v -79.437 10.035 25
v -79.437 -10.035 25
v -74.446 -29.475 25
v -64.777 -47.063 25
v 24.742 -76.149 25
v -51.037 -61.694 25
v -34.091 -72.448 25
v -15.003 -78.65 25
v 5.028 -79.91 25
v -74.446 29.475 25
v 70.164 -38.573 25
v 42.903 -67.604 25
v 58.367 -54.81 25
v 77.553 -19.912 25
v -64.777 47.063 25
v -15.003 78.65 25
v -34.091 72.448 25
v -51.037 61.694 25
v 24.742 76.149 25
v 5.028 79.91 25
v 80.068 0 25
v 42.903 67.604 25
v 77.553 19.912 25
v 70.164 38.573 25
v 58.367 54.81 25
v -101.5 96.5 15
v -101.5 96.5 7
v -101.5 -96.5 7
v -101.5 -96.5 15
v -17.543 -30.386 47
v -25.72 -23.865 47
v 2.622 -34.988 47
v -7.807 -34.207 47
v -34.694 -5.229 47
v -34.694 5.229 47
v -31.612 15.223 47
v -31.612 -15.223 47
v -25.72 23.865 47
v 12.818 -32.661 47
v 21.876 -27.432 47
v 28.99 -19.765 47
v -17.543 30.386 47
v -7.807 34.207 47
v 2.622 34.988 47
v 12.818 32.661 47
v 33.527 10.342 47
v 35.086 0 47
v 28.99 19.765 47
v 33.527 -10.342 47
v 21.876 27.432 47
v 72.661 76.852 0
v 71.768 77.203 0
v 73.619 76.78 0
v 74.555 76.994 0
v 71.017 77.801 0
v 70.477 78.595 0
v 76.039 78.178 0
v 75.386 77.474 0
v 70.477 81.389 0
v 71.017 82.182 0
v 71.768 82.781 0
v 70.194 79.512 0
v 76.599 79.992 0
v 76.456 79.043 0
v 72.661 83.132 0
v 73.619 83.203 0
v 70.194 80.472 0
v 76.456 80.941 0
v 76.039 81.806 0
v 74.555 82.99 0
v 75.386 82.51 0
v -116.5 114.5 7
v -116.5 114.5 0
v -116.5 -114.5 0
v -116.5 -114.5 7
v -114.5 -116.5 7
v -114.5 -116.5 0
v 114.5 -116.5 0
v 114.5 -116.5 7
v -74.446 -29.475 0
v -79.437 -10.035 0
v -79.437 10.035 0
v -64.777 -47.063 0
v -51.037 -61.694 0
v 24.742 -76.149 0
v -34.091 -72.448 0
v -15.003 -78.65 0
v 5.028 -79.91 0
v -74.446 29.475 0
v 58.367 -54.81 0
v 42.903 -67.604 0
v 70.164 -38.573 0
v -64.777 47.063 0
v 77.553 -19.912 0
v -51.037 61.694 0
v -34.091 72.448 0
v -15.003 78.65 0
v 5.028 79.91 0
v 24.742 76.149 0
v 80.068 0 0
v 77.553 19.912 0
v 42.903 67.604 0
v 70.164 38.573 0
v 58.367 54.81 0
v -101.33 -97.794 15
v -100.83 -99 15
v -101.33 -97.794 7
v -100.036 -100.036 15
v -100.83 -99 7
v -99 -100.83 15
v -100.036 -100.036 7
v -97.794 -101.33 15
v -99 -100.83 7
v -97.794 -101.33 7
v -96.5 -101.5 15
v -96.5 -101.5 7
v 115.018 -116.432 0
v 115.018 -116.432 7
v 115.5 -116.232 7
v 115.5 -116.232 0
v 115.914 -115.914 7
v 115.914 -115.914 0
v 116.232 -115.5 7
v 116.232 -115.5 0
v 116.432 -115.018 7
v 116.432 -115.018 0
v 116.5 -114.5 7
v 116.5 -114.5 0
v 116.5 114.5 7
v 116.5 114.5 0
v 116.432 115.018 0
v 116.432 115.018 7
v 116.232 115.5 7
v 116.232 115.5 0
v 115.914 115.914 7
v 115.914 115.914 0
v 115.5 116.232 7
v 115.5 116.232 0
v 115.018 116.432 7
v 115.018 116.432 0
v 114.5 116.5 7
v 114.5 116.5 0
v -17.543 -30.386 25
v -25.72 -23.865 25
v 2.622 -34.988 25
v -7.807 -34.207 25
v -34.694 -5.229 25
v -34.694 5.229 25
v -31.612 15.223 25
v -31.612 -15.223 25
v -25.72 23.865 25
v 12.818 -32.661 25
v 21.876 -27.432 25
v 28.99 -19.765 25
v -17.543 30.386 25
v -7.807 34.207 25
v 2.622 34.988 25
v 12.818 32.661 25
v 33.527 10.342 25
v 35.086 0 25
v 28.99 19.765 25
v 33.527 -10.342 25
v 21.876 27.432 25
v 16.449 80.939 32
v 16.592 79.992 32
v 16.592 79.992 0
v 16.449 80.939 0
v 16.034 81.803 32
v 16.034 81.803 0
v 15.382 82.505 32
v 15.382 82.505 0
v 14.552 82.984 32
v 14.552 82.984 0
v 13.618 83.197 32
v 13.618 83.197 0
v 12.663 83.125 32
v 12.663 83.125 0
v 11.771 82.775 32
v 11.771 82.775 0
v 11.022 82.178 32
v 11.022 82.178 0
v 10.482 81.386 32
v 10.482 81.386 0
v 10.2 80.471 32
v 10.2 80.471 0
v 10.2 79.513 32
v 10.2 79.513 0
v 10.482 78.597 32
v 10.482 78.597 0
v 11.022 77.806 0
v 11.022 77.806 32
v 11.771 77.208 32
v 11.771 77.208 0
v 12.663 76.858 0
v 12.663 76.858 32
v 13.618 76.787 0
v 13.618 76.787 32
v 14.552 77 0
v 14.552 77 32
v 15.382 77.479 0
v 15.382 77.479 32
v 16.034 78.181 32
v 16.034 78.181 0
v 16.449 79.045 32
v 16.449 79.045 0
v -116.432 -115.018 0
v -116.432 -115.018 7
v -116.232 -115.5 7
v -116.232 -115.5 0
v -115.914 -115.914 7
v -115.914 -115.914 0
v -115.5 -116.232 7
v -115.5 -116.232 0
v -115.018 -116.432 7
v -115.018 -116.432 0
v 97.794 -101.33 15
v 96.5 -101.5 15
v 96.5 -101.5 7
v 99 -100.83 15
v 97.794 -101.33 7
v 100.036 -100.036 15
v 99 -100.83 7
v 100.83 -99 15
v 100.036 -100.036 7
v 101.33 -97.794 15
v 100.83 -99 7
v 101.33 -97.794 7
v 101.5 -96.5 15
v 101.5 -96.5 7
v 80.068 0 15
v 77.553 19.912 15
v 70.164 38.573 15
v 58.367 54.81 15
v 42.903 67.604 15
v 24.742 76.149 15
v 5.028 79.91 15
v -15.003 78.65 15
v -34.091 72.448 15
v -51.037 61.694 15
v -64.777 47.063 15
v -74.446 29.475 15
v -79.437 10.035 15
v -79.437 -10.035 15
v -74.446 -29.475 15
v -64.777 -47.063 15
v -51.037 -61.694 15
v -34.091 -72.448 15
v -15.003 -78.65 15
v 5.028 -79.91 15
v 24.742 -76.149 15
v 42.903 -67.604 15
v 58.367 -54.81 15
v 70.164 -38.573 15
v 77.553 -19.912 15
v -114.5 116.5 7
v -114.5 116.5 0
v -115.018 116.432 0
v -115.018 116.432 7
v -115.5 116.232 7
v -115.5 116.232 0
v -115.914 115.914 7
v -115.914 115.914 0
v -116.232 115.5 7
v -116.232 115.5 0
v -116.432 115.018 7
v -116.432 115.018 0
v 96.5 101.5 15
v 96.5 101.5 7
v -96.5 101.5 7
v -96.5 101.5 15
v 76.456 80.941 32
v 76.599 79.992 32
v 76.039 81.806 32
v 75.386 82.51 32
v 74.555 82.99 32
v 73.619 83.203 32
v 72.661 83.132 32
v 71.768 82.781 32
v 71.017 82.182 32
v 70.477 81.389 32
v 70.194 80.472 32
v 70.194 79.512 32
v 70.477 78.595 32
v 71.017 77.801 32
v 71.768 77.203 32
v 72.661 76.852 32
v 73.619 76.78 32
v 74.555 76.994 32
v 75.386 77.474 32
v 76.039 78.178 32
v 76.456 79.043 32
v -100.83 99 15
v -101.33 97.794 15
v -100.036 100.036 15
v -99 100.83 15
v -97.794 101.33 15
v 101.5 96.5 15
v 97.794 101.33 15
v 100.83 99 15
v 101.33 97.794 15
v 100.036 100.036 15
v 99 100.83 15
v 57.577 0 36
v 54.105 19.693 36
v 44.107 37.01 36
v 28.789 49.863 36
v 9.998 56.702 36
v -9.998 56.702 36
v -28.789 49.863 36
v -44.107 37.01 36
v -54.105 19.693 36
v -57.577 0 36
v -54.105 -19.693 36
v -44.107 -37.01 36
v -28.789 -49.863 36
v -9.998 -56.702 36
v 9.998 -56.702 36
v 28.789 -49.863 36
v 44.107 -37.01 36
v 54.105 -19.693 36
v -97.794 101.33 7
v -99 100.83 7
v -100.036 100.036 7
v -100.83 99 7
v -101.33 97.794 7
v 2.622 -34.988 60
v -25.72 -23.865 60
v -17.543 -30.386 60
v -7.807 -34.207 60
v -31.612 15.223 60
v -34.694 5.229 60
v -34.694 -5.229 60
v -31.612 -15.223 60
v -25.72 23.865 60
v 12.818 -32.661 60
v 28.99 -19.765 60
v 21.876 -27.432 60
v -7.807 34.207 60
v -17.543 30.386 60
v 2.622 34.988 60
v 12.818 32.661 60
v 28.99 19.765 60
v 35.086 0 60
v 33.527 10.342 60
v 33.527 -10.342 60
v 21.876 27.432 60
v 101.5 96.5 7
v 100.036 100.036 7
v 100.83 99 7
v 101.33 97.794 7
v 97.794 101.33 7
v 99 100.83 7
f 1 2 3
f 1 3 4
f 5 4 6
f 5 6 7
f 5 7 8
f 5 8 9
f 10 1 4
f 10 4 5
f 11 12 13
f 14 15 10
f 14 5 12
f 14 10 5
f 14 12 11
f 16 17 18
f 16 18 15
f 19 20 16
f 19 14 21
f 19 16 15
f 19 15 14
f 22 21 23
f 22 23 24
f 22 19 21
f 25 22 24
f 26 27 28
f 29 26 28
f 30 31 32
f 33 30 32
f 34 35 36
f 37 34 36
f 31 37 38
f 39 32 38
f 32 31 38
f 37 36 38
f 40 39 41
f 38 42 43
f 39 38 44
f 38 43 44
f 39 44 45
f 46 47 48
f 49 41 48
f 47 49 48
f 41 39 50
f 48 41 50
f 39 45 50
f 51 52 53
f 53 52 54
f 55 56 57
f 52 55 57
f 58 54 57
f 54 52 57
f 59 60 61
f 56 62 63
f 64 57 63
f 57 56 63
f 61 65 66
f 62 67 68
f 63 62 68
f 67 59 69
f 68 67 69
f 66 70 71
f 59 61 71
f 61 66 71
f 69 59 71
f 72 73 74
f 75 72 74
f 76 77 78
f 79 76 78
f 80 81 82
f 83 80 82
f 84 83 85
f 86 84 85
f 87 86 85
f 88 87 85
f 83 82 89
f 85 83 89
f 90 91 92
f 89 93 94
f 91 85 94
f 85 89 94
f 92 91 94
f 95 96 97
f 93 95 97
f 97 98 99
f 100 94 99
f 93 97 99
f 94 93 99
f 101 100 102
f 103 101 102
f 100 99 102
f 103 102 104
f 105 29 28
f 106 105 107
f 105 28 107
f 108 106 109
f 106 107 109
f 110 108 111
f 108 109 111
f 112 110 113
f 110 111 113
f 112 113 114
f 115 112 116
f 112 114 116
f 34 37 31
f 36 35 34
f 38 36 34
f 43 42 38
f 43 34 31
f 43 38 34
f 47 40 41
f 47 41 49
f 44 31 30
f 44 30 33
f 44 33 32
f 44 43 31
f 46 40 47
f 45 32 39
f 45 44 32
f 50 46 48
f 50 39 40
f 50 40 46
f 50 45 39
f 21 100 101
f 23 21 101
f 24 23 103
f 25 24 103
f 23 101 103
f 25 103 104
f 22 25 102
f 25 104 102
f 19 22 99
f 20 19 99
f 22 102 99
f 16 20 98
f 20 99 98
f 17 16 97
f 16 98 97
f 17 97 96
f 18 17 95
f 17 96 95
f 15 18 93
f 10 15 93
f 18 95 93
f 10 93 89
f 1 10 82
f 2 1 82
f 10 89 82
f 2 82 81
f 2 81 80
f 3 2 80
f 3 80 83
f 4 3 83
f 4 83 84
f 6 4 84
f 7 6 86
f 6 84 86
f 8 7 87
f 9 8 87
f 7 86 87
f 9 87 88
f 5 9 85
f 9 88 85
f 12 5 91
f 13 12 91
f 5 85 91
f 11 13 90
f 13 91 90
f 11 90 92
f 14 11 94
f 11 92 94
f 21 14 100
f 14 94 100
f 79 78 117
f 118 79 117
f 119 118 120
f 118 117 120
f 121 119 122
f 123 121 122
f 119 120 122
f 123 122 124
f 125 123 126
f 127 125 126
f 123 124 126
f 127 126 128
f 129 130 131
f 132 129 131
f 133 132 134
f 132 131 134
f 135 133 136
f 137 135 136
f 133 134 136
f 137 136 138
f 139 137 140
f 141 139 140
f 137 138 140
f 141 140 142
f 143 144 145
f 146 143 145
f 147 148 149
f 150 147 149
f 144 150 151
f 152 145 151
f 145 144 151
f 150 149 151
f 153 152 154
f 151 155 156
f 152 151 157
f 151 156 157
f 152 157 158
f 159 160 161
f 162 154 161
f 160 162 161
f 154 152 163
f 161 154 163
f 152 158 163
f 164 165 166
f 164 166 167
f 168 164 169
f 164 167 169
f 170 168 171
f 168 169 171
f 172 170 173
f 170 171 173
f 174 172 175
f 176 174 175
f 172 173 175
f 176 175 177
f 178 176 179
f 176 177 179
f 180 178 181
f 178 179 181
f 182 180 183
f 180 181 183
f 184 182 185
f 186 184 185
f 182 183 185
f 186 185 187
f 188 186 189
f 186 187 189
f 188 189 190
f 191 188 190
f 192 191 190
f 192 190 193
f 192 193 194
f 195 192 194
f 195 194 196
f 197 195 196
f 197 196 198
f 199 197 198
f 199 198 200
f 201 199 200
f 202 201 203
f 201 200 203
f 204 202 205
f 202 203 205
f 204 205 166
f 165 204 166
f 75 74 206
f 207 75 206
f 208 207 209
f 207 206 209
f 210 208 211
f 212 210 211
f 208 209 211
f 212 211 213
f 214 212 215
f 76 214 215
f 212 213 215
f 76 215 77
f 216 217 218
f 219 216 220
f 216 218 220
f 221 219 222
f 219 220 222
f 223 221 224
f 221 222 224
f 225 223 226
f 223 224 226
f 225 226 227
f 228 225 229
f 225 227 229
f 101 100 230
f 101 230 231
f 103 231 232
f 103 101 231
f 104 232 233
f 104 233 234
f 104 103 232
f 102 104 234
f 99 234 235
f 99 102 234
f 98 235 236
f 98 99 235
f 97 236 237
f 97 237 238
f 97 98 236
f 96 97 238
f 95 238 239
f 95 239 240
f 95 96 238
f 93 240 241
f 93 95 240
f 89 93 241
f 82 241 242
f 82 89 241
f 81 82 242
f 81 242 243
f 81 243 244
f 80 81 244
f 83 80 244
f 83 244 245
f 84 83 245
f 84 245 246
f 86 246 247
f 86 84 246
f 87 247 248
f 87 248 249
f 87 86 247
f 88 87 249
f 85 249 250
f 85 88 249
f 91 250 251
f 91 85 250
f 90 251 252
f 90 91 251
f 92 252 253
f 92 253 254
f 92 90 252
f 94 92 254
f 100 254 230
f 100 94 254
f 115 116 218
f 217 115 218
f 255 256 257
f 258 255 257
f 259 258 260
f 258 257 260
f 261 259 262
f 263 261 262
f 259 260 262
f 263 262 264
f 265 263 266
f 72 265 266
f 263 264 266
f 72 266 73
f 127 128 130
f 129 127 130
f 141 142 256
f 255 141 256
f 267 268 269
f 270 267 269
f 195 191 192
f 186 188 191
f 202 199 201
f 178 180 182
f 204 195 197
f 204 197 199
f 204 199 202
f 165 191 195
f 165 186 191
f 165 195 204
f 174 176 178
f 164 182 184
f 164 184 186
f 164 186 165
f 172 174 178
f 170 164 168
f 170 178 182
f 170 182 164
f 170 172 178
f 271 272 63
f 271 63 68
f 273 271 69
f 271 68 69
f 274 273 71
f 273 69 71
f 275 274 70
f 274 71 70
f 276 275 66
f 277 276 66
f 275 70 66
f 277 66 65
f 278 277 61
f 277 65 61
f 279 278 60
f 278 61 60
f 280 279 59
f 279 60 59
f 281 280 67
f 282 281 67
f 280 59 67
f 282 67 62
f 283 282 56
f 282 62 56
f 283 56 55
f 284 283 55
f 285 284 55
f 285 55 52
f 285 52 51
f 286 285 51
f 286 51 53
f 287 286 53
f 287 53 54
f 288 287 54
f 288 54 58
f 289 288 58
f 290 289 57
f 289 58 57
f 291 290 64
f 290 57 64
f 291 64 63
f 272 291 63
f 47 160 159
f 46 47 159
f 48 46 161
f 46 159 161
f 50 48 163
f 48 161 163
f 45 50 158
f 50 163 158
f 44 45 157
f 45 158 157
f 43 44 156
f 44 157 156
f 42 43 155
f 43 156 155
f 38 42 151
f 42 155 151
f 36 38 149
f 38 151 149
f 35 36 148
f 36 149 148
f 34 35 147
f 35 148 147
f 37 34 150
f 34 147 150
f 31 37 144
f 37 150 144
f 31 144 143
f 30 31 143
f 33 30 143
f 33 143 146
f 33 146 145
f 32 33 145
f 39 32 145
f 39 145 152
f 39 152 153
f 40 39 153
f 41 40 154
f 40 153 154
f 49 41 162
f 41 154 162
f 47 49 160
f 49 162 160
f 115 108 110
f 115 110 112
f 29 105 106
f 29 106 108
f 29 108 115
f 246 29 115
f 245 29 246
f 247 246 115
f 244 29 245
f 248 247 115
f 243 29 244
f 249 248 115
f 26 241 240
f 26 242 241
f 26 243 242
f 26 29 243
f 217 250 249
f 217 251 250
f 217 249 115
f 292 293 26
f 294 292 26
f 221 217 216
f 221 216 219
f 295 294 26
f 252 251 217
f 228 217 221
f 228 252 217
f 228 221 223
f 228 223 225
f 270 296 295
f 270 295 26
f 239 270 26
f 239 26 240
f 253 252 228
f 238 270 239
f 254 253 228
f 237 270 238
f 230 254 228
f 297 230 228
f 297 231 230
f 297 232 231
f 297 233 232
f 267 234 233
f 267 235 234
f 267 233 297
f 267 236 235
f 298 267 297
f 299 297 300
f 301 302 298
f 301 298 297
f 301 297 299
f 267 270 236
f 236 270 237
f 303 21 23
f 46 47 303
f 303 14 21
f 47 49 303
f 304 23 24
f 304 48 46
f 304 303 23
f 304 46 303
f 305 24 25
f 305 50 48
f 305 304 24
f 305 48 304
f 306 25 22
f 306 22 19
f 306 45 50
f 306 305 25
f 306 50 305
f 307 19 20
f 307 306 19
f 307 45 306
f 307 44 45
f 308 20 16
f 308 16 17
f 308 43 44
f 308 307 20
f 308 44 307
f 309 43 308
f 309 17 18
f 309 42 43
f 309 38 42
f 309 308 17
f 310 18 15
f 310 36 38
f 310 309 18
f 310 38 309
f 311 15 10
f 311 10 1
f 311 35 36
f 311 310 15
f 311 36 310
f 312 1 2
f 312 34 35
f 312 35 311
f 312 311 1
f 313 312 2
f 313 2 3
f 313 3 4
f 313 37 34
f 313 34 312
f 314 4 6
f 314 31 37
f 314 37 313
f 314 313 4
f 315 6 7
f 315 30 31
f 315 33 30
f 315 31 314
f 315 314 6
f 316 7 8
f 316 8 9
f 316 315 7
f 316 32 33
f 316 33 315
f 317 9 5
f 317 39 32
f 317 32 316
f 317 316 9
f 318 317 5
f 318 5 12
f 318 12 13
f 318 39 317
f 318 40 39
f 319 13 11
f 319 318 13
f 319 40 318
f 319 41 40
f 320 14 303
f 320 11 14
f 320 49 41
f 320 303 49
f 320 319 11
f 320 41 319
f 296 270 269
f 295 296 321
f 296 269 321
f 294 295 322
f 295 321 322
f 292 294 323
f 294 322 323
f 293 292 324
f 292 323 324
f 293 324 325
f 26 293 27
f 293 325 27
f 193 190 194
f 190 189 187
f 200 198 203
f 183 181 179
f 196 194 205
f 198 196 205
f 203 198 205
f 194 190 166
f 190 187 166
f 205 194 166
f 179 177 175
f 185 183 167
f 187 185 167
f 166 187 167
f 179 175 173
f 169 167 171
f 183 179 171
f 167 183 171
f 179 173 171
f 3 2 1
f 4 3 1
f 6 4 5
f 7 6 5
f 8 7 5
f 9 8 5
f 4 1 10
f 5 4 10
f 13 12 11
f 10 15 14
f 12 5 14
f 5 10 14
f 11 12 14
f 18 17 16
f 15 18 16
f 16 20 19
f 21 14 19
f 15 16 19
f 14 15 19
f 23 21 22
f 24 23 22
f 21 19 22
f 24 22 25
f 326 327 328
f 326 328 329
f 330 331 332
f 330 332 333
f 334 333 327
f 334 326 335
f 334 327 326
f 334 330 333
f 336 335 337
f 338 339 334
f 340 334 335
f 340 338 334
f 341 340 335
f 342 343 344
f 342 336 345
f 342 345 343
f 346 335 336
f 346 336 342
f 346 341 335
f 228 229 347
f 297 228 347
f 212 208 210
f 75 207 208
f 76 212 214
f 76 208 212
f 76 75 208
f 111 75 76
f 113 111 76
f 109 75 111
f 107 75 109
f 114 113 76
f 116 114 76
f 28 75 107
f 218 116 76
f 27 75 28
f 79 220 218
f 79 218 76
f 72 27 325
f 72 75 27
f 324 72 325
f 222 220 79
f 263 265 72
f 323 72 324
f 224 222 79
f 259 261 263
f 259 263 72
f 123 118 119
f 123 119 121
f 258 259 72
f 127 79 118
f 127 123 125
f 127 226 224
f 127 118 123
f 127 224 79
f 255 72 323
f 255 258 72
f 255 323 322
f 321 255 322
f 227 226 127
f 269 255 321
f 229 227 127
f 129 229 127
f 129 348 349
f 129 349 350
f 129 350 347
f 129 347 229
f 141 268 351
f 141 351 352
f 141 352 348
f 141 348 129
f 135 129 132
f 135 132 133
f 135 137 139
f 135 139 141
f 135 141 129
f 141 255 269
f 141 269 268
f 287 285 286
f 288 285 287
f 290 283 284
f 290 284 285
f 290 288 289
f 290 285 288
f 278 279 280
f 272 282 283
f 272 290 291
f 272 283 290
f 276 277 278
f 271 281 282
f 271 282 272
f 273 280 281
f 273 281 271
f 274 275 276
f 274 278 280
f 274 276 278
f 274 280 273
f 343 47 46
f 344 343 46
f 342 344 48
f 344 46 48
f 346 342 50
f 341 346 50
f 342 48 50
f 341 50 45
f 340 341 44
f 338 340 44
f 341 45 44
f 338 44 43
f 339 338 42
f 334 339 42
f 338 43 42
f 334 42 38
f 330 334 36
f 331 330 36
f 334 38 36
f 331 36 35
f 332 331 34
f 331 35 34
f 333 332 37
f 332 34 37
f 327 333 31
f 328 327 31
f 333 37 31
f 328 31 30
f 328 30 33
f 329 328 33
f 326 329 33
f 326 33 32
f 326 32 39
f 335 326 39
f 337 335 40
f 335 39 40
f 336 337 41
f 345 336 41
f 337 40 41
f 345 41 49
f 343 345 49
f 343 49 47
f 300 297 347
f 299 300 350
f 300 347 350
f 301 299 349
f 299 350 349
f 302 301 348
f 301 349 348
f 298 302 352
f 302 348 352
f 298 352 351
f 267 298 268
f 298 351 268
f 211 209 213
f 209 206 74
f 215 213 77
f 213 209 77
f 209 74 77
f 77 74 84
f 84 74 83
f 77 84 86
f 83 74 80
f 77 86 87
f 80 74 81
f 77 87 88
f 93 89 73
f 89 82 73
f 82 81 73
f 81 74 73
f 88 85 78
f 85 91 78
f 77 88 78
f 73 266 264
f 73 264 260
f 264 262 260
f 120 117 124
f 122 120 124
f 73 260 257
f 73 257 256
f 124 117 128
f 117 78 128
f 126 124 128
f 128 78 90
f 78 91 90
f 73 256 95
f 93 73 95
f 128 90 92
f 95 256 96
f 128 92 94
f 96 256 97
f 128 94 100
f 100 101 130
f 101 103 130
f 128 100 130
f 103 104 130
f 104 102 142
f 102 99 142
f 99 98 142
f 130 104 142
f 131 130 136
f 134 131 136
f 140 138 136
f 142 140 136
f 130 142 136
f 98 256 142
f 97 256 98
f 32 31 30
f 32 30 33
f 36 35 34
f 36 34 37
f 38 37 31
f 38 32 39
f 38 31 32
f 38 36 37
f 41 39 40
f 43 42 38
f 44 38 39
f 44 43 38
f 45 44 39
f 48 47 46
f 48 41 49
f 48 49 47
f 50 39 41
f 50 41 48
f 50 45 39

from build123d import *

# Parameters (mm, degrees)
F0_R      = 80.0681985748
F1_DEPTH  = 15
F2_DEPTH  = 7
F7_START  = 25
F0_R_2    = 35.086234683
F7_DEPTH  = 22
F8_DEPTH  = 25
F8_FACE_R = 80.0681985748
F7_FACE_R = 35.086234683
F10_DEPTH = 13
F6_R      = 3.2141015645
F11_DEPTH = 32
F6_R_2    = 3.2204856396


# Not quite as in the source:
# - the program builds the solid bodies; features that only make, move or delete a surface that nothing else refers to are left out


with BuildPart() as f1:
    # F0 (on Top) → F1 (new body)
    with BuildSketch(Plane.XY):
        with BuildLine():
            ThreePointArc((-96.5, 101.5), (-100.0355339059, 100.0355339059), (-101.5, 96.5))
            Line((-101.5, 96.5), (-101.5, -96.5))
            ThreePointArc((-101.5, -96.5), (-100.0355339059, -100.0355339059), (-96.5, -101.5))
            Line((-96.5, -101.5), (96.5, -101.5))
            ThreePointArc((96.5, -101.5), (100.0355339059, -100.0355339059), (101.5, -96.5))
            Line((101.5, -96.5), (101.5, 96.5))
            ThreePointArc((101.5, 96.5), (100.0355339059, 100.0355339059), (96.5, 101.5))
            Line((96.5, 101.5), (-96.5, 101.5))
        make_face()
        Circle(F0_R, mode=Mode.SUBTRACT)
    extrude(amount=F1_DEPTH)

    # F0 (on Top) → F2 (join)
    with BuildSketch(Plane.XY):
        with BuildLine():
            Line((114.5, 116.5), (-114.5, 116.5))
            ThreePointArc((-114.5, 116.5), (-115.9142135624, 115.9142135624), (-116.5, 114.5))
            Line((-116.5, 114.5), (-116.5, -114.5))
            ThreePointArc((-116.5, -114.5), (-115.9142135624, -115.9142135624), (-114.5, -116.5))
            Line((-114.5, -116.5), (114.5, -116.5))
            ThreePointArc((114.5, -116.5), (115.9142135624, -115.9142135624), (116.5, -114.5))
            Line((116.5, -114.5), (116.5, 114.5))
            ThreePointArc((116.5, 114.5), (115.9142135624, 115.9142135624), (114.5, 116.5))
        make_face()
        with BuildLine():
            Line((-101.5, -96.5), (-101.5, 96.5))
            ThreePointArc((-101.5, 96.5), (-100.0355339059, 100.0355339059), (-96.5, 101.5))
            Line((-96.5, 101.5), (96.5, 101.5))
            ThreePointArc((96.5, 101.5), (100.0355339059, 100.0355339059), (101.5, 96.5))
            Line((101.5, 96.5), (101.5, -96.5))
            ThreePointArc((101.5, -96.5), (100.0355339059, -100.0355339059), (96.5, -101.5))
            Line((96.5, -101.5), (-96.5, -101.5))
            ThreePointArc((-96.5, -101.5), (-100.0355339059, -100.0355339059), (-101.5, -96.5))
        make_face(mode=Mode.SUBTRACT)
    extrude(amount=F2_DEPTH)


with BuildPart() as f7:
    # F0 (on Top) → F7 (new body)
    with BuildSketch(Plane.XY.offset(F7_START)):
        Circle(F0_R_2)
    extrude(amount=F7_DEPTH)


with BuildPart() as f8:
    # F0 (on Top) → F8 (new body)
    with BuildSketch(Plane.XY):
        Circle(F0_R)
        Circle(F0_R_2, mode=Mode.SUBTRACT)
        Circle(F0_R_2)
    extrude(amount=F8_DEPTH)


with BuildPart() as f9:
    # F8_face (on face) → F9 section 0
    with BuildSketch(Plane.XY.offset(25)):
        Circle(F8_FACE_R)
    # F7_face (on face) → F9 section 1
    with BuildSketch(Plane.XY.offset(47)):
        Circle(F7_FACE_R)
    loft()


with BuildPart() as f10:
    # F10 (new): a face of the model
    f10_faces = [f7.part.faces().sort_by_distance(p)[0] for p in [
        (0, 0, 47),
    ]]
    extrude(f10_faces, amount=F10_DEPTH)


with BuildPart() as f11:
    # F6 (on Top) → F11 (new body)
    with BuildSketch(Plane.XY):
        with Locations((13.3781218901, 79.9919366837)):
            Circle(F6_R)
    extrude(amount=F11_DEPTH)


with BuildPart() as f11b:
    # F6 (on Top) → F11, piece 2 (new body)
    with BuildSketch(Plane.XY):
        with Locations((73.3781218901, 79.9919366837)):
            Circle(F6_R_2)
    extrude(amount=F11_DEPTH)


solid = Compound([f1.part, f7.part, f8.part, f9.part, f10.part, f11.part, f11b.part])
